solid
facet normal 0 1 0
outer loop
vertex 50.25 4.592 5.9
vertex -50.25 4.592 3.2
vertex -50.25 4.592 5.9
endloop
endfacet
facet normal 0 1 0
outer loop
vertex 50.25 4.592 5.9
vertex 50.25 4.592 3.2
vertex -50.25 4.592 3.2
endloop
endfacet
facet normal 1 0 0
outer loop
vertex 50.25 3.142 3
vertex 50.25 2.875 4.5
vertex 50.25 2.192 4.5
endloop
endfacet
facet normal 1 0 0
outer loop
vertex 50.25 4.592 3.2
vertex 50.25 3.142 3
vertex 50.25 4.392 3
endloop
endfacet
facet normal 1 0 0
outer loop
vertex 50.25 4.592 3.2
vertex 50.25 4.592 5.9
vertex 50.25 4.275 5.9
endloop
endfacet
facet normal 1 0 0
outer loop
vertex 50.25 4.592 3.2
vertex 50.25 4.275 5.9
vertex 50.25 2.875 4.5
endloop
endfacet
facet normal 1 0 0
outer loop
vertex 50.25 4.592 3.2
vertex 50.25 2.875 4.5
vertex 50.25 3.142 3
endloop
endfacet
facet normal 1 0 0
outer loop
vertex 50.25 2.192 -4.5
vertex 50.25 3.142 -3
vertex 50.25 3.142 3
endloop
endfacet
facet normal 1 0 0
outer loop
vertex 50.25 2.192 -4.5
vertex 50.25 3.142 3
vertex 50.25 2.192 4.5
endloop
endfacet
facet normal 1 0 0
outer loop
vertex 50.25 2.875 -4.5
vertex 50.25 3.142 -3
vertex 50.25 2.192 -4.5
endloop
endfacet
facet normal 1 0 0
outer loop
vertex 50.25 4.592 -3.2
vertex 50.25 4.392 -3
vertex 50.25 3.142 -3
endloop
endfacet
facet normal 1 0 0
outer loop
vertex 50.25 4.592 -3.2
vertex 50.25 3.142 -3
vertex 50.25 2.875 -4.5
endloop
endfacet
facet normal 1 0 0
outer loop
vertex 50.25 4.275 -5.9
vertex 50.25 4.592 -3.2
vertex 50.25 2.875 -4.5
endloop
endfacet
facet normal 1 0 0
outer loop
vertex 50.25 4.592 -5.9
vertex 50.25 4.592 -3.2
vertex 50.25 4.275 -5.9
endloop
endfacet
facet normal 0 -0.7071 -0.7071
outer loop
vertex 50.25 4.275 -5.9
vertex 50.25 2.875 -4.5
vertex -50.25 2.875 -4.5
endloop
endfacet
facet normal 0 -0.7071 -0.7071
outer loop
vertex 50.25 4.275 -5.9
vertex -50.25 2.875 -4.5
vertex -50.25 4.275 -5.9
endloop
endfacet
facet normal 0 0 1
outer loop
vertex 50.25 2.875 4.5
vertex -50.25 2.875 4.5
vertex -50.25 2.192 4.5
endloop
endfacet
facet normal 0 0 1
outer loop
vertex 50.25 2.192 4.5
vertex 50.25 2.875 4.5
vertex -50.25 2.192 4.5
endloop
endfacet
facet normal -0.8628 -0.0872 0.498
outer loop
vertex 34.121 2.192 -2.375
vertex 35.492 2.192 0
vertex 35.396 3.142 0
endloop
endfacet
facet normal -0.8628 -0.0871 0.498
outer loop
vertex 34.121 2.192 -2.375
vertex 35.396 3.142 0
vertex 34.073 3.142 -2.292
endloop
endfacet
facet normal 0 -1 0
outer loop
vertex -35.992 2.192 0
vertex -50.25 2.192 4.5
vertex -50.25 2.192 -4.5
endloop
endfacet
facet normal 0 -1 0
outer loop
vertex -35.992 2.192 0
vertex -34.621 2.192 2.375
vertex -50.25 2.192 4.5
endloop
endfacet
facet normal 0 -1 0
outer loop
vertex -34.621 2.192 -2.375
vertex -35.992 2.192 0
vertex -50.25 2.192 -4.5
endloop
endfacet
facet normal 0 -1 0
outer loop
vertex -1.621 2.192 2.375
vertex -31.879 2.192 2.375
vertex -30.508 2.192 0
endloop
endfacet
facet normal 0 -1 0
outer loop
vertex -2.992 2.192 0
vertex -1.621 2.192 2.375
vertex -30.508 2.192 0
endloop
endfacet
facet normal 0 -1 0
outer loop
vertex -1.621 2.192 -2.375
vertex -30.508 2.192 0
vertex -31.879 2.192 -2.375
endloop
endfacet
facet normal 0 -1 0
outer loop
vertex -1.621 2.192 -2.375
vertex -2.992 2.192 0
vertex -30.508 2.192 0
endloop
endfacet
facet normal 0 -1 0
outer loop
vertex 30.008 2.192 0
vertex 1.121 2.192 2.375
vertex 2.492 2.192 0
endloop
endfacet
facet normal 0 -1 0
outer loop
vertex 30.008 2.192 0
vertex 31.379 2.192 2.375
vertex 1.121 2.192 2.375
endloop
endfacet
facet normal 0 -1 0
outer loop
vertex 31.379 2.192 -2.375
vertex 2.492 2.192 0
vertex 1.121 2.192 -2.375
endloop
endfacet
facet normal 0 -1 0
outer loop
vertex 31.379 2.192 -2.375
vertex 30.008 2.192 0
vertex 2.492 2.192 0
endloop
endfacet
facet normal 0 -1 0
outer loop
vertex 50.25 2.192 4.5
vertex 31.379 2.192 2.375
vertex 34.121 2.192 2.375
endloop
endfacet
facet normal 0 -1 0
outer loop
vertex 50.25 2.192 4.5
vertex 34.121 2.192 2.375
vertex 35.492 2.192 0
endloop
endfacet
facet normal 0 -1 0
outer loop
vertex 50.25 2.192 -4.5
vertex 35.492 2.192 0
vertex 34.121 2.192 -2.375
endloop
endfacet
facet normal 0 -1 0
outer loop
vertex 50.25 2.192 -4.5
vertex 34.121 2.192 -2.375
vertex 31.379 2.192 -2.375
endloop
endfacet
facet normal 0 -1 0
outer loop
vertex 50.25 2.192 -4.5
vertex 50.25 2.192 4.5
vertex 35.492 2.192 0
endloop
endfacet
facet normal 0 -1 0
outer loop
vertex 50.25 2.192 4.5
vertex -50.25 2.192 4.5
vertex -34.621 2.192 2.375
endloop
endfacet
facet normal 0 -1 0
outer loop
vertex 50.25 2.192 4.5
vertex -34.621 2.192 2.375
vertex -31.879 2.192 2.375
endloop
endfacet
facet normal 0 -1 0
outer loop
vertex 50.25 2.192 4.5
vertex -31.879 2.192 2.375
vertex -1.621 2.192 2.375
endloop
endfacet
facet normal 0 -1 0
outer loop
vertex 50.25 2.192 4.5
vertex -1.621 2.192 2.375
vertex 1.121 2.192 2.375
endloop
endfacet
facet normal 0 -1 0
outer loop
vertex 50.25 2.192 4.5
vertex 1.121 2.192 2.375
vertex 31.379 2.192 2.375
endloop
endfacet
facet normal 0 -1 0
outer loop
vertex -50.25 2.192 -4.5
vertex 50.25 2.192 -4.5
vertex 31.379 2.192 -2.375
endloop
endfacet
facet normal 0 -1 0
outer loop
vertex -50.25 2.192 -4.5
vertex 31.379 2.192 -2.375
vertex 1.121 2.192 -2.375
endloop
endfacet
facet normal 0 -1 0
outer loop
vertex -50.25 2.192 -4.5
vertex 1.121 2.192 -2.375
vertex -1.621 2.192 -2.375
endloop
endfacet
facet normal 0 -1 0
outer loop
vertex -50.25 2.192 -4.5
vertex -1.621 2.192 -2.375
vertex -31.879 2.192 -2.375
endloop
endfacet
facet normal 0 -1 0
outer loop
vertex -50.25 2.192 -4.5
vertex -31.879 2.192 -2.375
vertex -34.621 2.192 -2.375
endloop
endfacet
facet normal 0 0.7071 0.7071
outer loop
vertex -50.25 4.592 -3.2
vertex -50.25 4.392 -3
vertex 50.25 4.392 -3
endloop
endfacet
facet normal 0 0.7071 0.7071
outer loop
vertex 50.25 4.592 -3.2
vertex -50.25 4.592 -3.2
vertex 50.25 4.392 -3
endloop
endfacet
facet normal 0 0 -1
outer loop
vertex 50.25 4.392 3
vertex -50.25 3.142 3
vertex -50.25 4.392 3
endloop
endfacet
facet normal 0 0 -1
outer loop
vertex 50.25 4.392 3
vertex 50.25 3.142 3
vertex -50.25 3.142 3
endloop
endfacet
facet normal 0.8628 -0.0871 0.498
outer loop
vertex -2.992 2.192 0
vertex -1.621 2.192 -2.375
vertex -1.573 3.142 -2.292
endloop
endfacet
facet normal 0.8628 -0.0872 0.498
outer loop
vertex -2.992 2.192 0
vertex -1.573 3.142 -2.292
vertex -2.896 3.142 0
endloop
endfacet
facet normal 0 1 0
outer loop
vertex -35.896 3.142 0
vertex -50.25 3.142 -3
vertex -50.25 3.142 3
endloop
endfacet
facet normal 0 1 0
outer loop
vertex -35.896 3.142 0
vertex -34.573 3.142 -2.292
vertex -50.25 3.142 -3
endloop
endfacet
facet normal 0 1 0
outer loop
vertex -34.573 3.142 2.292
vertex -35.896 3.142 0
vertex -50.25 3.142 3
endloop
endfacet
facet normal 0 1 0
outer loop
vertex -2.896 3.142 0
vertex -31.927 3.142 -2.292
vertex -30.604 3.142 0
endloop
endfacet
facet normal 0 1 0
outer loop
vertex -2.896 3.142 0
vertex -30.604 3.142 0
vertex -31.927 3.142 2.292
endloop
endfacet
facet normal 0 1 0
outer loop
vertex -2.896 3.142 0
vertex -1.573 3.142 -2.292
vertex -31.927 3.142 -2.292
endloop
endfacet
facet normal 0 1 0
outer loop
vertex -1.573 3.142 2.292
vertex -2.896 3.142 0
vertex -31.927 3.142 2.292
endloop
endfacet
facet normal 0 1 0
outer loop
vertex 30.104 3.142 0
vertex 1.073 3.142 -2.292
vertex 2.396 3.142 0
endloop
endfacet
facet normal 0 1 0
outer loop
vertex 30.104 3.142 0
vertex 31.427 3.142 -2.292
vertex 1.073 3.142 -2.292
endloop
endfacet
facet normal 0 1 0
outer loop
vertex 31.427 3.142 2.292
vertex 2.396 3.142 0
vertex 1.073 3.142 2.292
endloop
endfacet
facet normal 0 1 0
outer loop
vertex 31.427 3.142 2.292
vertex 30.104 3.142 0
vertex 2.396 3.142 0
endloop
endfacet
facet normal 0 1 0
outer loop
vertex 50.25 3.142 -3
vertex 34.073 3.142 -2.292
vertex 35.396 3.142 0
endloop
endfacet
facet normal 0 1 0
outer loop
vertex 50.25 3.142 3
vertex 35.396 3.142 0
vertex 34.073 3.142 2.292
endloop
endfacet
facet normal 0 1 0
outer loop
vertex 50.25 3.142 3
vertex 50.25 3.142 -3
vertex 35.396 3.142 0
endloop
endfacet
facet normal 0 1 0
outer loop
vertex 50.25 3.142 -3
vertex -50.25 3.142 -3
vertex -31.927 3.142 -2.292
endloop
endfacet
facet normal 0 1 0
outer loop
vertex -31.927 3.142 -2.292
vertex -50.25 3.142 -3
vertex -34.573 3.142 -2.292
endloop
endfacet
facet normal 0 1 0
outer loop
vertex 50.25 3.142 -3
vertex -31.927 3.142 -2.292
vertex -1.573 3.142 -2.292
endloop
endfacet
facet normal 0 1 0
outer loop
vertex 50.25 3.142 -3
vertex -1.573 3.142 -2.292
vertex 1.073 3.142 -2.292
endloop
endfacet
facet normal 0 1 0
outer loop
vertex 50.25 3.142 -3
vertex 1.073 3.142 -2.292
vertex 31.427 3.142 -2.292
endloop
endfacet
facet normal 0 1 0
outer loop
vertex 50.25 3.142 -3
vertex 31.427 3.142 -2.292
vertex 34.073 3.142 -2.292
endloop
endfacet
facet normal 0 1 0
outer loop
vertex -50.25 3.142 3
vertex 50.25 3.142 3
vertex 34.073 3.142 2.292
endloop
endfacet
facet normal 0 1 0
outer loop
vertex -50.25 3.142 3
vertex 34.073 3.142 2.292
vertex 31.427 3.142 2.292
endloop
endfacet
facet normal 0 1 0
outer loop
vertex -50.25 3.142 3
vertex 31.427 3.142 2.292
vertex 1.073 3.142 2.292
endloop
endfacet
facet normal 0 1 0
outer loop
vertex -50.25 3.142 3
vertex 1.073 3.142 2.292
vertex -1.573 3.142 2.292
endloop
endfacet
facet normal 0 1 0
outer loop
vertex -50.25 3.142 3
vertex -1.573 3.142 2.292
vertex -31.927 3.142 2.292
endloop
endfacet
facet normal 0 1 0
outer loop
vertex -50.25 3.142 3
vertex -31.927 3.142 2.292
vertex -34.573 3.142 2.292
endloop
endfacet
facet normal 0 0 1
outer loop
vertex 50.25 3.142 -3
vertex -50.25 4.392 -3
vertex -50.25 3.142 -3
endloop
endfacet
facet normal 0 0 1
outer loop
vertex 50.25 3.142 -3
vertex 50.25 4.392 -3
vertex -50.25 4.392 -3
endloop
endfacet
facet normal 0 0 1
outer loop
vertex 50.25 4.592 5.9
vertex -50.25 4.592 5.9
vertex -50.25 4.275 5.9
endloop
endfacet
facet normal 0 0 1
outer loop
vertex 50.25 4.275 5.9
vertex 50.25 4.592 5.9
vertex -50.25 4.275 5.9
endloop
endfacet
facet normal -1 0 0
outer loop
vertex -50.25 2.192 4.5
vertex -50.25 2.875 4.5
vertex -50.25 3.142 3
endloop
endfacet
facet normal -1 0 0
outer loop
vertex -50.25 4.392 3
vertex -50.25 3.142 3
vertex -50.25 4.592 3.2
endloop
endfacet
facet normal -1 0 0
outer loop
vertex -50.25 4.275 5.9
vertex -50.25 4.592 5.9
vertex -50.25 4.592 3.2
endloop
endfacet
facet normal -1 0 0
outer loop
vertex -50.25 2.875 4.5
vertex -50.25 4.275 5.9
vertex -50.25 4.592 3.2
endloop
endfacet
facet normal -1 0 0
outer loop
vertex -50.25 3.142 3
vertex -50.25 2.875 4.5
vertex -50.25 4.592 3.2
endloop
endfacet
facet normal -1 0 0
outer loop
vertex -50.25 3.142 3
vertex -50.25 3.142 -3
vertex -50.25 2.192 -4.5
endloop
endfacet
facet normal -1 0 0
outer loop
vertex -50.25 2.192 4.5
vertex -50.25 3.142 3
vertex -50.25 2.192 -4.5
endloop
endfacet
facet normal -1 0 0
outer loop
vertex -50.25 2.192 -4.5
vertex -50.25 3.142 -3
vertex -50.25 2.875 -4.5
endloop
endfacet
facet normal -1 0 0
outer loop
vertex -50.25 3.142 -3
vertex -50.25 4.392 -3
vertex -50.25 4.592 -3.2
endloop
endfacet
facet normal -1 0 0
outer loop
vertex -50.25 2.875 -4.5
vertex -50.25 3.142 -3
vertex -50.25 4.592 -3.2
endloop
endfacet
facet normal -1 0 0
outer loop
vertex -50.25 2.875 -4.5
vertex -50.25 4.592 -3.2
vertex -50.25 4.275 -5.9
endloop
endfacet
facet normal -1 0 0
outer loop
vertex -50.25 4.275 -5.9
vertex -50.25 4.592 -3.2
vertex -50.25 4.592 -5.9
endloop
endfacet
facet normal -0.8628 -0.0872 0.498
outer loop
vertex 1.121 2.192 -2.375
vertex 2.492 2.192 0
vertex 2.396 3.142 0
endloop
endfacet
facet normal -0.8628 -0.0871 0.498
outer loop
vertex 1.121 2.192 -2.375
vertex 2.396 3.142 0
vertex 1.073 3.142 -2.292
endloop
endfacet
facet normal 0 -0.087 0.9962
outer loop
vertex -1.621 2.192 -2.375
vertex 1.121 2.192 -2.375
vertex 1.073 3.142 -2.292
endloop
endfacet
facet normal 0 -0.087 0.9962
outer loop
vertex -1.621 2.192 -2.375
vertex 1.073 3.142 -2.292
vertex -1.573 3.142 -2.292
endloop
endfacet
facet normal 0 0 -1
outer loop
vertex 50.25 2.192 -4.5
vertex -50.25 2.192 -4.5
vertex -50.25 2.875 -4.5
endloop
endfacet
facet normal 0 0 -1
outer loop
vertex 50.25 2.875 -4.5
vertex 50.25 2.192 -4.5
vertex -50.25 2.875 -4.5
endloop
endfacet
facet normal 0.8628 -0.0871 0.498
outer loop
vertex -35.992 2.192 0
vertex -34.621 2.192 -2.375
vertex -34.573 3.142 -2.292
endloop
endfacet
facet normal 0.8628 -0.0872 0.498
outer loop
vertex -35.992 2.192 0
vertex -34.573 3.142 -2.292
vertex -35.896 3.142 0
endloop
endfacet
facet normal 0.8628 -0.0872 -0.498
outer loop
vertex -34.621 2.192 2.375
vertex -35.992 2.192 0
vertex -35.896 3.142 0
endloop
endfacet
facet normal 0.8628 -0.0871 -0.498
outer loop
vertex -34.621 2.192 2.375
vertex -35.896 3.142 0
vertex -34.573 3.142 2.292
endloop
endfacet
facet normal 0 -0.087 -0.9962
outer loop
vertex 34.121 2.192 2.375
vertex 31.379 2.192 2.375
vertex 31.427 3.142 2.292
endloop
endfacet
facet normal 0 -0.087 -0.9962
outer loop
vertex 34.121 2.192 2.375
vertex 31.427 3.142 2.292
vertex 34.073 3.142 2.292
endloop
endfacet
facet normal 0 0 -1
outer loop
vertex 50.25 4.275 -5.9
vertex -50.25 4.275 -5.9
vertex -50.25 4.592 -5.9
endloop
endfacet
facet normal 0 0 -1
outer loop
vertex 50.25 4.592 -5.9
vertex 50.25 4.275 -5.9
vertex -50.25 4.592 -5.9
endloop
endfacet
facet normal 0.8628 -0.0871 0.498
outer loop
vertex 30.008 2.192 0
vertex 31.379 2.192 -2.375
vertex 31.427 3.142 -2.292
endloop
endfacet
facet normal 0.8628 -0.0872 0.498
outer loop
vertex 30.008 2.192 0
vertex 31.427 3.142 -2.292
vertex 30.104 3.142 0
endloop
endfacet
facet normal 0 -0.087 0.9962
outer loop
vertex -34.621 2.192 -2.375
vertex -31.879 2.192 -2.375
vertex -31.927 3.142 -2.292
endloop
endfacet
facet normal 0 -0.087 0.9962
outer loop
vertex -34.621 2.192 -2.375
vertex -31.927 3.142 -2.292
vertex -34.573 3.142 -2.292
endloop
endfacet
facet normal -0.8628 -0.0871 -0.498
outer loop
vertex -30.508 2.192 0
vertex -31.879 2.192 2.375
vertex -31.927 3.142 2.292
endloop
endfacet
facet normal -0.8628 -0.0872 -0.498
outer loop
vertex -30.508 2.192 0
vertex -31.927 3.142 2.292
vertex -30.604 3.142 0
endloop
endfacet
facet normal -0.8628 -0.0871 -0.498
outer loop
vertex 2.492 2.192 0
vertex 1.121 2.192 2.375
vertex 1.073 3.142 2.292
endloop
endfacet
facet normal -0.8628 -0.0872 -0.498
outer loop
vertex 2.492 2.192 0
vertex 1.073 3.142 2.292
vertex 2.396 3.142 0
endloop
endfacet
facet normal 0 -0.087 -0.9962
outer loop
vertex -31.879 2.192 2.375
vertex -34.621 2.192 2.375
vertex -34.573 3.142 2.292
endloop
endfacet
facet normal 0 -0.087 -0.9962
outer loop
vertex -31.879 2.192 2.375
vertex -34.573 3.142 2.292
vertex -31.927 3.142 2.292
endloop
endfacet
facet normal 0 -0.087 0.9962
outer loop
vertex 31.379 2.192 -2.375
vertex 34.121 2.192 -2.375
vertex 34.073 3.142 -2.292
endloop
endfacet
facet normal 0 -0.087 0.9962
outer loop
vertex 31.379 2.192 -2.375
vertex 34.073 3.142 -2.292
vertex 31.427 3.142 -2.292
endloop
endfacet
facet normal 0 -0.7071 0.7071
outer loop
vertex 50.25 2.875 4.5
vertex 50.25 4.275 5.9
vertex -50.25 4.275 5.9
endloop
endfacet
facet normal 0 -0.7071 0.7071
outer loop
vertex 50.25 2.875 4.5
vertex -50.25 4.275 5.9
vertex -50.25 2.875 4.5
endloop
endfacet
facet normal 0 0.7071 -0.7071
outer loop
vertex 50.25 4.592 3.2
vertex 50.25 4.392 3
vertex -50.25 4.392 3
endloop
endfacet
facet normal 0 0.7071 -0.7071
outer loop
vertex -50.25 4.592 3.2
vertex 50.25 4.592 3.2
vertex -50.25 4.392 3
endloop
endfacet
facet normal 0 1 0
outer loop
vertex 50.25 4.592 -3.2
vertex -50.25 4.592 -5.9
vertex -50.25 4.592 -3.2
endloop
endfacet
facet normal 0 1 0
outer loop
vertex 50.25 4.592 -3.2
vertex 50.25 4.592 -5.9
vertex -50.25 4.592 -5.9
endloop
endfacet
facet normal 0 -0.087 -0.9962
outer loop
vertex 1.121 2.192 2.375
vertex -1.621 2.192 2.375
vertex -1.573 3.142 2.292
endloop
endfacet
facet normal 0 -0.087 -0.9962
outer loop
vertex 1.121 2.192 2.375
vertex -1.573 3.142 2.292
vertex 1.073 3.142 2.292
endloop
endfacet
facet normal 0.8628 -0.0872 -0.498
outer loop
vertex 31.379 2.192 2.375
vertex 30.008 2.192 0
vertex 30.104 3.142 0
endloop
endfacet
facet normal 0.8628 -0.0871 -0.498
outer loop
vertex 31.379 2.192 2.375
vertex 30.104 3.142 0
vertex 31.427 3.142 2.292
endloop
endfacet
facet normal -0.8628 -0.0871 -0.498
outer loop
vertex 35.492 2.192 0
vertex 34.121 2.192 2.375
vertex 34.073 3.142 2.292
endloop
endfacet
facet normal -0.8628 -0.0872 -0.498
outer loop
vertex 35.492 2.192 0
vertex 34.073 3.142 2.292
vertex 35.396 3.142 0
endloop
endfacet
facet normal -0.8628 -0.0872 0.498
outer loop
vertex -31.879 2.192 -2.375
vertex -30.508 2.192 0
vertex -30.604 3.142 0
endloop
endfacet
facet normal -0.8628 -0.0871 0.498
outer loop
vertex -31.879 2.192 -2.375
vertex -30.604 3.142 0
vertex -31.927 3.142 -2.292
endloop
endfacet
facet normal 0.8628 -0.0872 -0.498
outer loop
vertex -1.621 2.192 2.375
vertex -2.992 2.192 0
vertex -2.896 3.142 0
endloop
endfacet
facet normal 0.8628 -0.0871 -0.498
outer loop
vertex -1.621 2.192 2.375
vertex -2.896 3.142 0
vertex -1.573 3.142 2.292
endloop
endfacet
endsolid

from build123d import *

# Parameters (mm, degrees)
BOSS_EXTRUDE1_DEPTH = 50.25
CUT_EXTRUDE2_DEPTH  = 3.4
CUT_EXTRUDE2_TAPER  = -5
CHAMFER1_SIZE       = 0.2


with BuildPart() as part:
    # Retainer Profile → Boss-Extrude1 (new body, symmetric)
    with BuildSketch(Plane(origin=(0, 0, 0), x_dir=(0, 0, -1), z_dir=(1, 0, 0))):
        Polygon((-5.1, 4.592304845), (-5.9, 4.592304845), (-5.9, 4.275147558), (-4.5, 2.875147558), (-4.5, 2.192304845), (4.5, 2.192304845), (4.5, 2.875147558), (5.9, 4.275147558), (5.9, 4.592304845), (5.1, 4.592304845), (3, 4.592304845), (3, 3.142304845), (-3, 3.142304845), (-3, 4.592304845), align=None)
    extrude(amount=BOSS_EXTRUDE1_DEPTH, both=True)

    # Sketch3 → Cut-Extrude2 (cut, through all)
    with BuildSketch(Plane(origin=(0, 4.592304845, 0), x_dir=(1, 0, 0), z_dir=(0, 1, 0))):
        Polygon((35.25, 0), (34, 2.165063509), (31.5, 2.165063509), (30.25, 0), (31.5, -2.165063509), (34, -2.165063509), align=None)
        Polygon((2.25, 0), (1, 2.165063509), (-1.5, 2.165063509), (-2.75, 0), (-1.5, -2.165063509), (1, -2.165063509), align=None)
        Polygon((-30.75, 0), (-32, 2.165063509), (-34.5, 2.165063509), (-35.75, 0), (-34.5, -2.165063509), (-32, -2.165063509), align=None)
    extrude(amount=-CUT_EXTRUDE2_DEPTH, taper=CUT_EXTRUDE2_TAPER, mode=Mode.SUBTRACT)

    # Chamfer1
    chamfer1_edges = [part.edges().sort_by_distance(p)[0] for p in [
        (0, 4.592304845, 3),
        (0, 4.592304845, -3),
    ]]
    chamfer(chamfer1_edges, length=CHAMFER1_SIZE)


solid = part.part
